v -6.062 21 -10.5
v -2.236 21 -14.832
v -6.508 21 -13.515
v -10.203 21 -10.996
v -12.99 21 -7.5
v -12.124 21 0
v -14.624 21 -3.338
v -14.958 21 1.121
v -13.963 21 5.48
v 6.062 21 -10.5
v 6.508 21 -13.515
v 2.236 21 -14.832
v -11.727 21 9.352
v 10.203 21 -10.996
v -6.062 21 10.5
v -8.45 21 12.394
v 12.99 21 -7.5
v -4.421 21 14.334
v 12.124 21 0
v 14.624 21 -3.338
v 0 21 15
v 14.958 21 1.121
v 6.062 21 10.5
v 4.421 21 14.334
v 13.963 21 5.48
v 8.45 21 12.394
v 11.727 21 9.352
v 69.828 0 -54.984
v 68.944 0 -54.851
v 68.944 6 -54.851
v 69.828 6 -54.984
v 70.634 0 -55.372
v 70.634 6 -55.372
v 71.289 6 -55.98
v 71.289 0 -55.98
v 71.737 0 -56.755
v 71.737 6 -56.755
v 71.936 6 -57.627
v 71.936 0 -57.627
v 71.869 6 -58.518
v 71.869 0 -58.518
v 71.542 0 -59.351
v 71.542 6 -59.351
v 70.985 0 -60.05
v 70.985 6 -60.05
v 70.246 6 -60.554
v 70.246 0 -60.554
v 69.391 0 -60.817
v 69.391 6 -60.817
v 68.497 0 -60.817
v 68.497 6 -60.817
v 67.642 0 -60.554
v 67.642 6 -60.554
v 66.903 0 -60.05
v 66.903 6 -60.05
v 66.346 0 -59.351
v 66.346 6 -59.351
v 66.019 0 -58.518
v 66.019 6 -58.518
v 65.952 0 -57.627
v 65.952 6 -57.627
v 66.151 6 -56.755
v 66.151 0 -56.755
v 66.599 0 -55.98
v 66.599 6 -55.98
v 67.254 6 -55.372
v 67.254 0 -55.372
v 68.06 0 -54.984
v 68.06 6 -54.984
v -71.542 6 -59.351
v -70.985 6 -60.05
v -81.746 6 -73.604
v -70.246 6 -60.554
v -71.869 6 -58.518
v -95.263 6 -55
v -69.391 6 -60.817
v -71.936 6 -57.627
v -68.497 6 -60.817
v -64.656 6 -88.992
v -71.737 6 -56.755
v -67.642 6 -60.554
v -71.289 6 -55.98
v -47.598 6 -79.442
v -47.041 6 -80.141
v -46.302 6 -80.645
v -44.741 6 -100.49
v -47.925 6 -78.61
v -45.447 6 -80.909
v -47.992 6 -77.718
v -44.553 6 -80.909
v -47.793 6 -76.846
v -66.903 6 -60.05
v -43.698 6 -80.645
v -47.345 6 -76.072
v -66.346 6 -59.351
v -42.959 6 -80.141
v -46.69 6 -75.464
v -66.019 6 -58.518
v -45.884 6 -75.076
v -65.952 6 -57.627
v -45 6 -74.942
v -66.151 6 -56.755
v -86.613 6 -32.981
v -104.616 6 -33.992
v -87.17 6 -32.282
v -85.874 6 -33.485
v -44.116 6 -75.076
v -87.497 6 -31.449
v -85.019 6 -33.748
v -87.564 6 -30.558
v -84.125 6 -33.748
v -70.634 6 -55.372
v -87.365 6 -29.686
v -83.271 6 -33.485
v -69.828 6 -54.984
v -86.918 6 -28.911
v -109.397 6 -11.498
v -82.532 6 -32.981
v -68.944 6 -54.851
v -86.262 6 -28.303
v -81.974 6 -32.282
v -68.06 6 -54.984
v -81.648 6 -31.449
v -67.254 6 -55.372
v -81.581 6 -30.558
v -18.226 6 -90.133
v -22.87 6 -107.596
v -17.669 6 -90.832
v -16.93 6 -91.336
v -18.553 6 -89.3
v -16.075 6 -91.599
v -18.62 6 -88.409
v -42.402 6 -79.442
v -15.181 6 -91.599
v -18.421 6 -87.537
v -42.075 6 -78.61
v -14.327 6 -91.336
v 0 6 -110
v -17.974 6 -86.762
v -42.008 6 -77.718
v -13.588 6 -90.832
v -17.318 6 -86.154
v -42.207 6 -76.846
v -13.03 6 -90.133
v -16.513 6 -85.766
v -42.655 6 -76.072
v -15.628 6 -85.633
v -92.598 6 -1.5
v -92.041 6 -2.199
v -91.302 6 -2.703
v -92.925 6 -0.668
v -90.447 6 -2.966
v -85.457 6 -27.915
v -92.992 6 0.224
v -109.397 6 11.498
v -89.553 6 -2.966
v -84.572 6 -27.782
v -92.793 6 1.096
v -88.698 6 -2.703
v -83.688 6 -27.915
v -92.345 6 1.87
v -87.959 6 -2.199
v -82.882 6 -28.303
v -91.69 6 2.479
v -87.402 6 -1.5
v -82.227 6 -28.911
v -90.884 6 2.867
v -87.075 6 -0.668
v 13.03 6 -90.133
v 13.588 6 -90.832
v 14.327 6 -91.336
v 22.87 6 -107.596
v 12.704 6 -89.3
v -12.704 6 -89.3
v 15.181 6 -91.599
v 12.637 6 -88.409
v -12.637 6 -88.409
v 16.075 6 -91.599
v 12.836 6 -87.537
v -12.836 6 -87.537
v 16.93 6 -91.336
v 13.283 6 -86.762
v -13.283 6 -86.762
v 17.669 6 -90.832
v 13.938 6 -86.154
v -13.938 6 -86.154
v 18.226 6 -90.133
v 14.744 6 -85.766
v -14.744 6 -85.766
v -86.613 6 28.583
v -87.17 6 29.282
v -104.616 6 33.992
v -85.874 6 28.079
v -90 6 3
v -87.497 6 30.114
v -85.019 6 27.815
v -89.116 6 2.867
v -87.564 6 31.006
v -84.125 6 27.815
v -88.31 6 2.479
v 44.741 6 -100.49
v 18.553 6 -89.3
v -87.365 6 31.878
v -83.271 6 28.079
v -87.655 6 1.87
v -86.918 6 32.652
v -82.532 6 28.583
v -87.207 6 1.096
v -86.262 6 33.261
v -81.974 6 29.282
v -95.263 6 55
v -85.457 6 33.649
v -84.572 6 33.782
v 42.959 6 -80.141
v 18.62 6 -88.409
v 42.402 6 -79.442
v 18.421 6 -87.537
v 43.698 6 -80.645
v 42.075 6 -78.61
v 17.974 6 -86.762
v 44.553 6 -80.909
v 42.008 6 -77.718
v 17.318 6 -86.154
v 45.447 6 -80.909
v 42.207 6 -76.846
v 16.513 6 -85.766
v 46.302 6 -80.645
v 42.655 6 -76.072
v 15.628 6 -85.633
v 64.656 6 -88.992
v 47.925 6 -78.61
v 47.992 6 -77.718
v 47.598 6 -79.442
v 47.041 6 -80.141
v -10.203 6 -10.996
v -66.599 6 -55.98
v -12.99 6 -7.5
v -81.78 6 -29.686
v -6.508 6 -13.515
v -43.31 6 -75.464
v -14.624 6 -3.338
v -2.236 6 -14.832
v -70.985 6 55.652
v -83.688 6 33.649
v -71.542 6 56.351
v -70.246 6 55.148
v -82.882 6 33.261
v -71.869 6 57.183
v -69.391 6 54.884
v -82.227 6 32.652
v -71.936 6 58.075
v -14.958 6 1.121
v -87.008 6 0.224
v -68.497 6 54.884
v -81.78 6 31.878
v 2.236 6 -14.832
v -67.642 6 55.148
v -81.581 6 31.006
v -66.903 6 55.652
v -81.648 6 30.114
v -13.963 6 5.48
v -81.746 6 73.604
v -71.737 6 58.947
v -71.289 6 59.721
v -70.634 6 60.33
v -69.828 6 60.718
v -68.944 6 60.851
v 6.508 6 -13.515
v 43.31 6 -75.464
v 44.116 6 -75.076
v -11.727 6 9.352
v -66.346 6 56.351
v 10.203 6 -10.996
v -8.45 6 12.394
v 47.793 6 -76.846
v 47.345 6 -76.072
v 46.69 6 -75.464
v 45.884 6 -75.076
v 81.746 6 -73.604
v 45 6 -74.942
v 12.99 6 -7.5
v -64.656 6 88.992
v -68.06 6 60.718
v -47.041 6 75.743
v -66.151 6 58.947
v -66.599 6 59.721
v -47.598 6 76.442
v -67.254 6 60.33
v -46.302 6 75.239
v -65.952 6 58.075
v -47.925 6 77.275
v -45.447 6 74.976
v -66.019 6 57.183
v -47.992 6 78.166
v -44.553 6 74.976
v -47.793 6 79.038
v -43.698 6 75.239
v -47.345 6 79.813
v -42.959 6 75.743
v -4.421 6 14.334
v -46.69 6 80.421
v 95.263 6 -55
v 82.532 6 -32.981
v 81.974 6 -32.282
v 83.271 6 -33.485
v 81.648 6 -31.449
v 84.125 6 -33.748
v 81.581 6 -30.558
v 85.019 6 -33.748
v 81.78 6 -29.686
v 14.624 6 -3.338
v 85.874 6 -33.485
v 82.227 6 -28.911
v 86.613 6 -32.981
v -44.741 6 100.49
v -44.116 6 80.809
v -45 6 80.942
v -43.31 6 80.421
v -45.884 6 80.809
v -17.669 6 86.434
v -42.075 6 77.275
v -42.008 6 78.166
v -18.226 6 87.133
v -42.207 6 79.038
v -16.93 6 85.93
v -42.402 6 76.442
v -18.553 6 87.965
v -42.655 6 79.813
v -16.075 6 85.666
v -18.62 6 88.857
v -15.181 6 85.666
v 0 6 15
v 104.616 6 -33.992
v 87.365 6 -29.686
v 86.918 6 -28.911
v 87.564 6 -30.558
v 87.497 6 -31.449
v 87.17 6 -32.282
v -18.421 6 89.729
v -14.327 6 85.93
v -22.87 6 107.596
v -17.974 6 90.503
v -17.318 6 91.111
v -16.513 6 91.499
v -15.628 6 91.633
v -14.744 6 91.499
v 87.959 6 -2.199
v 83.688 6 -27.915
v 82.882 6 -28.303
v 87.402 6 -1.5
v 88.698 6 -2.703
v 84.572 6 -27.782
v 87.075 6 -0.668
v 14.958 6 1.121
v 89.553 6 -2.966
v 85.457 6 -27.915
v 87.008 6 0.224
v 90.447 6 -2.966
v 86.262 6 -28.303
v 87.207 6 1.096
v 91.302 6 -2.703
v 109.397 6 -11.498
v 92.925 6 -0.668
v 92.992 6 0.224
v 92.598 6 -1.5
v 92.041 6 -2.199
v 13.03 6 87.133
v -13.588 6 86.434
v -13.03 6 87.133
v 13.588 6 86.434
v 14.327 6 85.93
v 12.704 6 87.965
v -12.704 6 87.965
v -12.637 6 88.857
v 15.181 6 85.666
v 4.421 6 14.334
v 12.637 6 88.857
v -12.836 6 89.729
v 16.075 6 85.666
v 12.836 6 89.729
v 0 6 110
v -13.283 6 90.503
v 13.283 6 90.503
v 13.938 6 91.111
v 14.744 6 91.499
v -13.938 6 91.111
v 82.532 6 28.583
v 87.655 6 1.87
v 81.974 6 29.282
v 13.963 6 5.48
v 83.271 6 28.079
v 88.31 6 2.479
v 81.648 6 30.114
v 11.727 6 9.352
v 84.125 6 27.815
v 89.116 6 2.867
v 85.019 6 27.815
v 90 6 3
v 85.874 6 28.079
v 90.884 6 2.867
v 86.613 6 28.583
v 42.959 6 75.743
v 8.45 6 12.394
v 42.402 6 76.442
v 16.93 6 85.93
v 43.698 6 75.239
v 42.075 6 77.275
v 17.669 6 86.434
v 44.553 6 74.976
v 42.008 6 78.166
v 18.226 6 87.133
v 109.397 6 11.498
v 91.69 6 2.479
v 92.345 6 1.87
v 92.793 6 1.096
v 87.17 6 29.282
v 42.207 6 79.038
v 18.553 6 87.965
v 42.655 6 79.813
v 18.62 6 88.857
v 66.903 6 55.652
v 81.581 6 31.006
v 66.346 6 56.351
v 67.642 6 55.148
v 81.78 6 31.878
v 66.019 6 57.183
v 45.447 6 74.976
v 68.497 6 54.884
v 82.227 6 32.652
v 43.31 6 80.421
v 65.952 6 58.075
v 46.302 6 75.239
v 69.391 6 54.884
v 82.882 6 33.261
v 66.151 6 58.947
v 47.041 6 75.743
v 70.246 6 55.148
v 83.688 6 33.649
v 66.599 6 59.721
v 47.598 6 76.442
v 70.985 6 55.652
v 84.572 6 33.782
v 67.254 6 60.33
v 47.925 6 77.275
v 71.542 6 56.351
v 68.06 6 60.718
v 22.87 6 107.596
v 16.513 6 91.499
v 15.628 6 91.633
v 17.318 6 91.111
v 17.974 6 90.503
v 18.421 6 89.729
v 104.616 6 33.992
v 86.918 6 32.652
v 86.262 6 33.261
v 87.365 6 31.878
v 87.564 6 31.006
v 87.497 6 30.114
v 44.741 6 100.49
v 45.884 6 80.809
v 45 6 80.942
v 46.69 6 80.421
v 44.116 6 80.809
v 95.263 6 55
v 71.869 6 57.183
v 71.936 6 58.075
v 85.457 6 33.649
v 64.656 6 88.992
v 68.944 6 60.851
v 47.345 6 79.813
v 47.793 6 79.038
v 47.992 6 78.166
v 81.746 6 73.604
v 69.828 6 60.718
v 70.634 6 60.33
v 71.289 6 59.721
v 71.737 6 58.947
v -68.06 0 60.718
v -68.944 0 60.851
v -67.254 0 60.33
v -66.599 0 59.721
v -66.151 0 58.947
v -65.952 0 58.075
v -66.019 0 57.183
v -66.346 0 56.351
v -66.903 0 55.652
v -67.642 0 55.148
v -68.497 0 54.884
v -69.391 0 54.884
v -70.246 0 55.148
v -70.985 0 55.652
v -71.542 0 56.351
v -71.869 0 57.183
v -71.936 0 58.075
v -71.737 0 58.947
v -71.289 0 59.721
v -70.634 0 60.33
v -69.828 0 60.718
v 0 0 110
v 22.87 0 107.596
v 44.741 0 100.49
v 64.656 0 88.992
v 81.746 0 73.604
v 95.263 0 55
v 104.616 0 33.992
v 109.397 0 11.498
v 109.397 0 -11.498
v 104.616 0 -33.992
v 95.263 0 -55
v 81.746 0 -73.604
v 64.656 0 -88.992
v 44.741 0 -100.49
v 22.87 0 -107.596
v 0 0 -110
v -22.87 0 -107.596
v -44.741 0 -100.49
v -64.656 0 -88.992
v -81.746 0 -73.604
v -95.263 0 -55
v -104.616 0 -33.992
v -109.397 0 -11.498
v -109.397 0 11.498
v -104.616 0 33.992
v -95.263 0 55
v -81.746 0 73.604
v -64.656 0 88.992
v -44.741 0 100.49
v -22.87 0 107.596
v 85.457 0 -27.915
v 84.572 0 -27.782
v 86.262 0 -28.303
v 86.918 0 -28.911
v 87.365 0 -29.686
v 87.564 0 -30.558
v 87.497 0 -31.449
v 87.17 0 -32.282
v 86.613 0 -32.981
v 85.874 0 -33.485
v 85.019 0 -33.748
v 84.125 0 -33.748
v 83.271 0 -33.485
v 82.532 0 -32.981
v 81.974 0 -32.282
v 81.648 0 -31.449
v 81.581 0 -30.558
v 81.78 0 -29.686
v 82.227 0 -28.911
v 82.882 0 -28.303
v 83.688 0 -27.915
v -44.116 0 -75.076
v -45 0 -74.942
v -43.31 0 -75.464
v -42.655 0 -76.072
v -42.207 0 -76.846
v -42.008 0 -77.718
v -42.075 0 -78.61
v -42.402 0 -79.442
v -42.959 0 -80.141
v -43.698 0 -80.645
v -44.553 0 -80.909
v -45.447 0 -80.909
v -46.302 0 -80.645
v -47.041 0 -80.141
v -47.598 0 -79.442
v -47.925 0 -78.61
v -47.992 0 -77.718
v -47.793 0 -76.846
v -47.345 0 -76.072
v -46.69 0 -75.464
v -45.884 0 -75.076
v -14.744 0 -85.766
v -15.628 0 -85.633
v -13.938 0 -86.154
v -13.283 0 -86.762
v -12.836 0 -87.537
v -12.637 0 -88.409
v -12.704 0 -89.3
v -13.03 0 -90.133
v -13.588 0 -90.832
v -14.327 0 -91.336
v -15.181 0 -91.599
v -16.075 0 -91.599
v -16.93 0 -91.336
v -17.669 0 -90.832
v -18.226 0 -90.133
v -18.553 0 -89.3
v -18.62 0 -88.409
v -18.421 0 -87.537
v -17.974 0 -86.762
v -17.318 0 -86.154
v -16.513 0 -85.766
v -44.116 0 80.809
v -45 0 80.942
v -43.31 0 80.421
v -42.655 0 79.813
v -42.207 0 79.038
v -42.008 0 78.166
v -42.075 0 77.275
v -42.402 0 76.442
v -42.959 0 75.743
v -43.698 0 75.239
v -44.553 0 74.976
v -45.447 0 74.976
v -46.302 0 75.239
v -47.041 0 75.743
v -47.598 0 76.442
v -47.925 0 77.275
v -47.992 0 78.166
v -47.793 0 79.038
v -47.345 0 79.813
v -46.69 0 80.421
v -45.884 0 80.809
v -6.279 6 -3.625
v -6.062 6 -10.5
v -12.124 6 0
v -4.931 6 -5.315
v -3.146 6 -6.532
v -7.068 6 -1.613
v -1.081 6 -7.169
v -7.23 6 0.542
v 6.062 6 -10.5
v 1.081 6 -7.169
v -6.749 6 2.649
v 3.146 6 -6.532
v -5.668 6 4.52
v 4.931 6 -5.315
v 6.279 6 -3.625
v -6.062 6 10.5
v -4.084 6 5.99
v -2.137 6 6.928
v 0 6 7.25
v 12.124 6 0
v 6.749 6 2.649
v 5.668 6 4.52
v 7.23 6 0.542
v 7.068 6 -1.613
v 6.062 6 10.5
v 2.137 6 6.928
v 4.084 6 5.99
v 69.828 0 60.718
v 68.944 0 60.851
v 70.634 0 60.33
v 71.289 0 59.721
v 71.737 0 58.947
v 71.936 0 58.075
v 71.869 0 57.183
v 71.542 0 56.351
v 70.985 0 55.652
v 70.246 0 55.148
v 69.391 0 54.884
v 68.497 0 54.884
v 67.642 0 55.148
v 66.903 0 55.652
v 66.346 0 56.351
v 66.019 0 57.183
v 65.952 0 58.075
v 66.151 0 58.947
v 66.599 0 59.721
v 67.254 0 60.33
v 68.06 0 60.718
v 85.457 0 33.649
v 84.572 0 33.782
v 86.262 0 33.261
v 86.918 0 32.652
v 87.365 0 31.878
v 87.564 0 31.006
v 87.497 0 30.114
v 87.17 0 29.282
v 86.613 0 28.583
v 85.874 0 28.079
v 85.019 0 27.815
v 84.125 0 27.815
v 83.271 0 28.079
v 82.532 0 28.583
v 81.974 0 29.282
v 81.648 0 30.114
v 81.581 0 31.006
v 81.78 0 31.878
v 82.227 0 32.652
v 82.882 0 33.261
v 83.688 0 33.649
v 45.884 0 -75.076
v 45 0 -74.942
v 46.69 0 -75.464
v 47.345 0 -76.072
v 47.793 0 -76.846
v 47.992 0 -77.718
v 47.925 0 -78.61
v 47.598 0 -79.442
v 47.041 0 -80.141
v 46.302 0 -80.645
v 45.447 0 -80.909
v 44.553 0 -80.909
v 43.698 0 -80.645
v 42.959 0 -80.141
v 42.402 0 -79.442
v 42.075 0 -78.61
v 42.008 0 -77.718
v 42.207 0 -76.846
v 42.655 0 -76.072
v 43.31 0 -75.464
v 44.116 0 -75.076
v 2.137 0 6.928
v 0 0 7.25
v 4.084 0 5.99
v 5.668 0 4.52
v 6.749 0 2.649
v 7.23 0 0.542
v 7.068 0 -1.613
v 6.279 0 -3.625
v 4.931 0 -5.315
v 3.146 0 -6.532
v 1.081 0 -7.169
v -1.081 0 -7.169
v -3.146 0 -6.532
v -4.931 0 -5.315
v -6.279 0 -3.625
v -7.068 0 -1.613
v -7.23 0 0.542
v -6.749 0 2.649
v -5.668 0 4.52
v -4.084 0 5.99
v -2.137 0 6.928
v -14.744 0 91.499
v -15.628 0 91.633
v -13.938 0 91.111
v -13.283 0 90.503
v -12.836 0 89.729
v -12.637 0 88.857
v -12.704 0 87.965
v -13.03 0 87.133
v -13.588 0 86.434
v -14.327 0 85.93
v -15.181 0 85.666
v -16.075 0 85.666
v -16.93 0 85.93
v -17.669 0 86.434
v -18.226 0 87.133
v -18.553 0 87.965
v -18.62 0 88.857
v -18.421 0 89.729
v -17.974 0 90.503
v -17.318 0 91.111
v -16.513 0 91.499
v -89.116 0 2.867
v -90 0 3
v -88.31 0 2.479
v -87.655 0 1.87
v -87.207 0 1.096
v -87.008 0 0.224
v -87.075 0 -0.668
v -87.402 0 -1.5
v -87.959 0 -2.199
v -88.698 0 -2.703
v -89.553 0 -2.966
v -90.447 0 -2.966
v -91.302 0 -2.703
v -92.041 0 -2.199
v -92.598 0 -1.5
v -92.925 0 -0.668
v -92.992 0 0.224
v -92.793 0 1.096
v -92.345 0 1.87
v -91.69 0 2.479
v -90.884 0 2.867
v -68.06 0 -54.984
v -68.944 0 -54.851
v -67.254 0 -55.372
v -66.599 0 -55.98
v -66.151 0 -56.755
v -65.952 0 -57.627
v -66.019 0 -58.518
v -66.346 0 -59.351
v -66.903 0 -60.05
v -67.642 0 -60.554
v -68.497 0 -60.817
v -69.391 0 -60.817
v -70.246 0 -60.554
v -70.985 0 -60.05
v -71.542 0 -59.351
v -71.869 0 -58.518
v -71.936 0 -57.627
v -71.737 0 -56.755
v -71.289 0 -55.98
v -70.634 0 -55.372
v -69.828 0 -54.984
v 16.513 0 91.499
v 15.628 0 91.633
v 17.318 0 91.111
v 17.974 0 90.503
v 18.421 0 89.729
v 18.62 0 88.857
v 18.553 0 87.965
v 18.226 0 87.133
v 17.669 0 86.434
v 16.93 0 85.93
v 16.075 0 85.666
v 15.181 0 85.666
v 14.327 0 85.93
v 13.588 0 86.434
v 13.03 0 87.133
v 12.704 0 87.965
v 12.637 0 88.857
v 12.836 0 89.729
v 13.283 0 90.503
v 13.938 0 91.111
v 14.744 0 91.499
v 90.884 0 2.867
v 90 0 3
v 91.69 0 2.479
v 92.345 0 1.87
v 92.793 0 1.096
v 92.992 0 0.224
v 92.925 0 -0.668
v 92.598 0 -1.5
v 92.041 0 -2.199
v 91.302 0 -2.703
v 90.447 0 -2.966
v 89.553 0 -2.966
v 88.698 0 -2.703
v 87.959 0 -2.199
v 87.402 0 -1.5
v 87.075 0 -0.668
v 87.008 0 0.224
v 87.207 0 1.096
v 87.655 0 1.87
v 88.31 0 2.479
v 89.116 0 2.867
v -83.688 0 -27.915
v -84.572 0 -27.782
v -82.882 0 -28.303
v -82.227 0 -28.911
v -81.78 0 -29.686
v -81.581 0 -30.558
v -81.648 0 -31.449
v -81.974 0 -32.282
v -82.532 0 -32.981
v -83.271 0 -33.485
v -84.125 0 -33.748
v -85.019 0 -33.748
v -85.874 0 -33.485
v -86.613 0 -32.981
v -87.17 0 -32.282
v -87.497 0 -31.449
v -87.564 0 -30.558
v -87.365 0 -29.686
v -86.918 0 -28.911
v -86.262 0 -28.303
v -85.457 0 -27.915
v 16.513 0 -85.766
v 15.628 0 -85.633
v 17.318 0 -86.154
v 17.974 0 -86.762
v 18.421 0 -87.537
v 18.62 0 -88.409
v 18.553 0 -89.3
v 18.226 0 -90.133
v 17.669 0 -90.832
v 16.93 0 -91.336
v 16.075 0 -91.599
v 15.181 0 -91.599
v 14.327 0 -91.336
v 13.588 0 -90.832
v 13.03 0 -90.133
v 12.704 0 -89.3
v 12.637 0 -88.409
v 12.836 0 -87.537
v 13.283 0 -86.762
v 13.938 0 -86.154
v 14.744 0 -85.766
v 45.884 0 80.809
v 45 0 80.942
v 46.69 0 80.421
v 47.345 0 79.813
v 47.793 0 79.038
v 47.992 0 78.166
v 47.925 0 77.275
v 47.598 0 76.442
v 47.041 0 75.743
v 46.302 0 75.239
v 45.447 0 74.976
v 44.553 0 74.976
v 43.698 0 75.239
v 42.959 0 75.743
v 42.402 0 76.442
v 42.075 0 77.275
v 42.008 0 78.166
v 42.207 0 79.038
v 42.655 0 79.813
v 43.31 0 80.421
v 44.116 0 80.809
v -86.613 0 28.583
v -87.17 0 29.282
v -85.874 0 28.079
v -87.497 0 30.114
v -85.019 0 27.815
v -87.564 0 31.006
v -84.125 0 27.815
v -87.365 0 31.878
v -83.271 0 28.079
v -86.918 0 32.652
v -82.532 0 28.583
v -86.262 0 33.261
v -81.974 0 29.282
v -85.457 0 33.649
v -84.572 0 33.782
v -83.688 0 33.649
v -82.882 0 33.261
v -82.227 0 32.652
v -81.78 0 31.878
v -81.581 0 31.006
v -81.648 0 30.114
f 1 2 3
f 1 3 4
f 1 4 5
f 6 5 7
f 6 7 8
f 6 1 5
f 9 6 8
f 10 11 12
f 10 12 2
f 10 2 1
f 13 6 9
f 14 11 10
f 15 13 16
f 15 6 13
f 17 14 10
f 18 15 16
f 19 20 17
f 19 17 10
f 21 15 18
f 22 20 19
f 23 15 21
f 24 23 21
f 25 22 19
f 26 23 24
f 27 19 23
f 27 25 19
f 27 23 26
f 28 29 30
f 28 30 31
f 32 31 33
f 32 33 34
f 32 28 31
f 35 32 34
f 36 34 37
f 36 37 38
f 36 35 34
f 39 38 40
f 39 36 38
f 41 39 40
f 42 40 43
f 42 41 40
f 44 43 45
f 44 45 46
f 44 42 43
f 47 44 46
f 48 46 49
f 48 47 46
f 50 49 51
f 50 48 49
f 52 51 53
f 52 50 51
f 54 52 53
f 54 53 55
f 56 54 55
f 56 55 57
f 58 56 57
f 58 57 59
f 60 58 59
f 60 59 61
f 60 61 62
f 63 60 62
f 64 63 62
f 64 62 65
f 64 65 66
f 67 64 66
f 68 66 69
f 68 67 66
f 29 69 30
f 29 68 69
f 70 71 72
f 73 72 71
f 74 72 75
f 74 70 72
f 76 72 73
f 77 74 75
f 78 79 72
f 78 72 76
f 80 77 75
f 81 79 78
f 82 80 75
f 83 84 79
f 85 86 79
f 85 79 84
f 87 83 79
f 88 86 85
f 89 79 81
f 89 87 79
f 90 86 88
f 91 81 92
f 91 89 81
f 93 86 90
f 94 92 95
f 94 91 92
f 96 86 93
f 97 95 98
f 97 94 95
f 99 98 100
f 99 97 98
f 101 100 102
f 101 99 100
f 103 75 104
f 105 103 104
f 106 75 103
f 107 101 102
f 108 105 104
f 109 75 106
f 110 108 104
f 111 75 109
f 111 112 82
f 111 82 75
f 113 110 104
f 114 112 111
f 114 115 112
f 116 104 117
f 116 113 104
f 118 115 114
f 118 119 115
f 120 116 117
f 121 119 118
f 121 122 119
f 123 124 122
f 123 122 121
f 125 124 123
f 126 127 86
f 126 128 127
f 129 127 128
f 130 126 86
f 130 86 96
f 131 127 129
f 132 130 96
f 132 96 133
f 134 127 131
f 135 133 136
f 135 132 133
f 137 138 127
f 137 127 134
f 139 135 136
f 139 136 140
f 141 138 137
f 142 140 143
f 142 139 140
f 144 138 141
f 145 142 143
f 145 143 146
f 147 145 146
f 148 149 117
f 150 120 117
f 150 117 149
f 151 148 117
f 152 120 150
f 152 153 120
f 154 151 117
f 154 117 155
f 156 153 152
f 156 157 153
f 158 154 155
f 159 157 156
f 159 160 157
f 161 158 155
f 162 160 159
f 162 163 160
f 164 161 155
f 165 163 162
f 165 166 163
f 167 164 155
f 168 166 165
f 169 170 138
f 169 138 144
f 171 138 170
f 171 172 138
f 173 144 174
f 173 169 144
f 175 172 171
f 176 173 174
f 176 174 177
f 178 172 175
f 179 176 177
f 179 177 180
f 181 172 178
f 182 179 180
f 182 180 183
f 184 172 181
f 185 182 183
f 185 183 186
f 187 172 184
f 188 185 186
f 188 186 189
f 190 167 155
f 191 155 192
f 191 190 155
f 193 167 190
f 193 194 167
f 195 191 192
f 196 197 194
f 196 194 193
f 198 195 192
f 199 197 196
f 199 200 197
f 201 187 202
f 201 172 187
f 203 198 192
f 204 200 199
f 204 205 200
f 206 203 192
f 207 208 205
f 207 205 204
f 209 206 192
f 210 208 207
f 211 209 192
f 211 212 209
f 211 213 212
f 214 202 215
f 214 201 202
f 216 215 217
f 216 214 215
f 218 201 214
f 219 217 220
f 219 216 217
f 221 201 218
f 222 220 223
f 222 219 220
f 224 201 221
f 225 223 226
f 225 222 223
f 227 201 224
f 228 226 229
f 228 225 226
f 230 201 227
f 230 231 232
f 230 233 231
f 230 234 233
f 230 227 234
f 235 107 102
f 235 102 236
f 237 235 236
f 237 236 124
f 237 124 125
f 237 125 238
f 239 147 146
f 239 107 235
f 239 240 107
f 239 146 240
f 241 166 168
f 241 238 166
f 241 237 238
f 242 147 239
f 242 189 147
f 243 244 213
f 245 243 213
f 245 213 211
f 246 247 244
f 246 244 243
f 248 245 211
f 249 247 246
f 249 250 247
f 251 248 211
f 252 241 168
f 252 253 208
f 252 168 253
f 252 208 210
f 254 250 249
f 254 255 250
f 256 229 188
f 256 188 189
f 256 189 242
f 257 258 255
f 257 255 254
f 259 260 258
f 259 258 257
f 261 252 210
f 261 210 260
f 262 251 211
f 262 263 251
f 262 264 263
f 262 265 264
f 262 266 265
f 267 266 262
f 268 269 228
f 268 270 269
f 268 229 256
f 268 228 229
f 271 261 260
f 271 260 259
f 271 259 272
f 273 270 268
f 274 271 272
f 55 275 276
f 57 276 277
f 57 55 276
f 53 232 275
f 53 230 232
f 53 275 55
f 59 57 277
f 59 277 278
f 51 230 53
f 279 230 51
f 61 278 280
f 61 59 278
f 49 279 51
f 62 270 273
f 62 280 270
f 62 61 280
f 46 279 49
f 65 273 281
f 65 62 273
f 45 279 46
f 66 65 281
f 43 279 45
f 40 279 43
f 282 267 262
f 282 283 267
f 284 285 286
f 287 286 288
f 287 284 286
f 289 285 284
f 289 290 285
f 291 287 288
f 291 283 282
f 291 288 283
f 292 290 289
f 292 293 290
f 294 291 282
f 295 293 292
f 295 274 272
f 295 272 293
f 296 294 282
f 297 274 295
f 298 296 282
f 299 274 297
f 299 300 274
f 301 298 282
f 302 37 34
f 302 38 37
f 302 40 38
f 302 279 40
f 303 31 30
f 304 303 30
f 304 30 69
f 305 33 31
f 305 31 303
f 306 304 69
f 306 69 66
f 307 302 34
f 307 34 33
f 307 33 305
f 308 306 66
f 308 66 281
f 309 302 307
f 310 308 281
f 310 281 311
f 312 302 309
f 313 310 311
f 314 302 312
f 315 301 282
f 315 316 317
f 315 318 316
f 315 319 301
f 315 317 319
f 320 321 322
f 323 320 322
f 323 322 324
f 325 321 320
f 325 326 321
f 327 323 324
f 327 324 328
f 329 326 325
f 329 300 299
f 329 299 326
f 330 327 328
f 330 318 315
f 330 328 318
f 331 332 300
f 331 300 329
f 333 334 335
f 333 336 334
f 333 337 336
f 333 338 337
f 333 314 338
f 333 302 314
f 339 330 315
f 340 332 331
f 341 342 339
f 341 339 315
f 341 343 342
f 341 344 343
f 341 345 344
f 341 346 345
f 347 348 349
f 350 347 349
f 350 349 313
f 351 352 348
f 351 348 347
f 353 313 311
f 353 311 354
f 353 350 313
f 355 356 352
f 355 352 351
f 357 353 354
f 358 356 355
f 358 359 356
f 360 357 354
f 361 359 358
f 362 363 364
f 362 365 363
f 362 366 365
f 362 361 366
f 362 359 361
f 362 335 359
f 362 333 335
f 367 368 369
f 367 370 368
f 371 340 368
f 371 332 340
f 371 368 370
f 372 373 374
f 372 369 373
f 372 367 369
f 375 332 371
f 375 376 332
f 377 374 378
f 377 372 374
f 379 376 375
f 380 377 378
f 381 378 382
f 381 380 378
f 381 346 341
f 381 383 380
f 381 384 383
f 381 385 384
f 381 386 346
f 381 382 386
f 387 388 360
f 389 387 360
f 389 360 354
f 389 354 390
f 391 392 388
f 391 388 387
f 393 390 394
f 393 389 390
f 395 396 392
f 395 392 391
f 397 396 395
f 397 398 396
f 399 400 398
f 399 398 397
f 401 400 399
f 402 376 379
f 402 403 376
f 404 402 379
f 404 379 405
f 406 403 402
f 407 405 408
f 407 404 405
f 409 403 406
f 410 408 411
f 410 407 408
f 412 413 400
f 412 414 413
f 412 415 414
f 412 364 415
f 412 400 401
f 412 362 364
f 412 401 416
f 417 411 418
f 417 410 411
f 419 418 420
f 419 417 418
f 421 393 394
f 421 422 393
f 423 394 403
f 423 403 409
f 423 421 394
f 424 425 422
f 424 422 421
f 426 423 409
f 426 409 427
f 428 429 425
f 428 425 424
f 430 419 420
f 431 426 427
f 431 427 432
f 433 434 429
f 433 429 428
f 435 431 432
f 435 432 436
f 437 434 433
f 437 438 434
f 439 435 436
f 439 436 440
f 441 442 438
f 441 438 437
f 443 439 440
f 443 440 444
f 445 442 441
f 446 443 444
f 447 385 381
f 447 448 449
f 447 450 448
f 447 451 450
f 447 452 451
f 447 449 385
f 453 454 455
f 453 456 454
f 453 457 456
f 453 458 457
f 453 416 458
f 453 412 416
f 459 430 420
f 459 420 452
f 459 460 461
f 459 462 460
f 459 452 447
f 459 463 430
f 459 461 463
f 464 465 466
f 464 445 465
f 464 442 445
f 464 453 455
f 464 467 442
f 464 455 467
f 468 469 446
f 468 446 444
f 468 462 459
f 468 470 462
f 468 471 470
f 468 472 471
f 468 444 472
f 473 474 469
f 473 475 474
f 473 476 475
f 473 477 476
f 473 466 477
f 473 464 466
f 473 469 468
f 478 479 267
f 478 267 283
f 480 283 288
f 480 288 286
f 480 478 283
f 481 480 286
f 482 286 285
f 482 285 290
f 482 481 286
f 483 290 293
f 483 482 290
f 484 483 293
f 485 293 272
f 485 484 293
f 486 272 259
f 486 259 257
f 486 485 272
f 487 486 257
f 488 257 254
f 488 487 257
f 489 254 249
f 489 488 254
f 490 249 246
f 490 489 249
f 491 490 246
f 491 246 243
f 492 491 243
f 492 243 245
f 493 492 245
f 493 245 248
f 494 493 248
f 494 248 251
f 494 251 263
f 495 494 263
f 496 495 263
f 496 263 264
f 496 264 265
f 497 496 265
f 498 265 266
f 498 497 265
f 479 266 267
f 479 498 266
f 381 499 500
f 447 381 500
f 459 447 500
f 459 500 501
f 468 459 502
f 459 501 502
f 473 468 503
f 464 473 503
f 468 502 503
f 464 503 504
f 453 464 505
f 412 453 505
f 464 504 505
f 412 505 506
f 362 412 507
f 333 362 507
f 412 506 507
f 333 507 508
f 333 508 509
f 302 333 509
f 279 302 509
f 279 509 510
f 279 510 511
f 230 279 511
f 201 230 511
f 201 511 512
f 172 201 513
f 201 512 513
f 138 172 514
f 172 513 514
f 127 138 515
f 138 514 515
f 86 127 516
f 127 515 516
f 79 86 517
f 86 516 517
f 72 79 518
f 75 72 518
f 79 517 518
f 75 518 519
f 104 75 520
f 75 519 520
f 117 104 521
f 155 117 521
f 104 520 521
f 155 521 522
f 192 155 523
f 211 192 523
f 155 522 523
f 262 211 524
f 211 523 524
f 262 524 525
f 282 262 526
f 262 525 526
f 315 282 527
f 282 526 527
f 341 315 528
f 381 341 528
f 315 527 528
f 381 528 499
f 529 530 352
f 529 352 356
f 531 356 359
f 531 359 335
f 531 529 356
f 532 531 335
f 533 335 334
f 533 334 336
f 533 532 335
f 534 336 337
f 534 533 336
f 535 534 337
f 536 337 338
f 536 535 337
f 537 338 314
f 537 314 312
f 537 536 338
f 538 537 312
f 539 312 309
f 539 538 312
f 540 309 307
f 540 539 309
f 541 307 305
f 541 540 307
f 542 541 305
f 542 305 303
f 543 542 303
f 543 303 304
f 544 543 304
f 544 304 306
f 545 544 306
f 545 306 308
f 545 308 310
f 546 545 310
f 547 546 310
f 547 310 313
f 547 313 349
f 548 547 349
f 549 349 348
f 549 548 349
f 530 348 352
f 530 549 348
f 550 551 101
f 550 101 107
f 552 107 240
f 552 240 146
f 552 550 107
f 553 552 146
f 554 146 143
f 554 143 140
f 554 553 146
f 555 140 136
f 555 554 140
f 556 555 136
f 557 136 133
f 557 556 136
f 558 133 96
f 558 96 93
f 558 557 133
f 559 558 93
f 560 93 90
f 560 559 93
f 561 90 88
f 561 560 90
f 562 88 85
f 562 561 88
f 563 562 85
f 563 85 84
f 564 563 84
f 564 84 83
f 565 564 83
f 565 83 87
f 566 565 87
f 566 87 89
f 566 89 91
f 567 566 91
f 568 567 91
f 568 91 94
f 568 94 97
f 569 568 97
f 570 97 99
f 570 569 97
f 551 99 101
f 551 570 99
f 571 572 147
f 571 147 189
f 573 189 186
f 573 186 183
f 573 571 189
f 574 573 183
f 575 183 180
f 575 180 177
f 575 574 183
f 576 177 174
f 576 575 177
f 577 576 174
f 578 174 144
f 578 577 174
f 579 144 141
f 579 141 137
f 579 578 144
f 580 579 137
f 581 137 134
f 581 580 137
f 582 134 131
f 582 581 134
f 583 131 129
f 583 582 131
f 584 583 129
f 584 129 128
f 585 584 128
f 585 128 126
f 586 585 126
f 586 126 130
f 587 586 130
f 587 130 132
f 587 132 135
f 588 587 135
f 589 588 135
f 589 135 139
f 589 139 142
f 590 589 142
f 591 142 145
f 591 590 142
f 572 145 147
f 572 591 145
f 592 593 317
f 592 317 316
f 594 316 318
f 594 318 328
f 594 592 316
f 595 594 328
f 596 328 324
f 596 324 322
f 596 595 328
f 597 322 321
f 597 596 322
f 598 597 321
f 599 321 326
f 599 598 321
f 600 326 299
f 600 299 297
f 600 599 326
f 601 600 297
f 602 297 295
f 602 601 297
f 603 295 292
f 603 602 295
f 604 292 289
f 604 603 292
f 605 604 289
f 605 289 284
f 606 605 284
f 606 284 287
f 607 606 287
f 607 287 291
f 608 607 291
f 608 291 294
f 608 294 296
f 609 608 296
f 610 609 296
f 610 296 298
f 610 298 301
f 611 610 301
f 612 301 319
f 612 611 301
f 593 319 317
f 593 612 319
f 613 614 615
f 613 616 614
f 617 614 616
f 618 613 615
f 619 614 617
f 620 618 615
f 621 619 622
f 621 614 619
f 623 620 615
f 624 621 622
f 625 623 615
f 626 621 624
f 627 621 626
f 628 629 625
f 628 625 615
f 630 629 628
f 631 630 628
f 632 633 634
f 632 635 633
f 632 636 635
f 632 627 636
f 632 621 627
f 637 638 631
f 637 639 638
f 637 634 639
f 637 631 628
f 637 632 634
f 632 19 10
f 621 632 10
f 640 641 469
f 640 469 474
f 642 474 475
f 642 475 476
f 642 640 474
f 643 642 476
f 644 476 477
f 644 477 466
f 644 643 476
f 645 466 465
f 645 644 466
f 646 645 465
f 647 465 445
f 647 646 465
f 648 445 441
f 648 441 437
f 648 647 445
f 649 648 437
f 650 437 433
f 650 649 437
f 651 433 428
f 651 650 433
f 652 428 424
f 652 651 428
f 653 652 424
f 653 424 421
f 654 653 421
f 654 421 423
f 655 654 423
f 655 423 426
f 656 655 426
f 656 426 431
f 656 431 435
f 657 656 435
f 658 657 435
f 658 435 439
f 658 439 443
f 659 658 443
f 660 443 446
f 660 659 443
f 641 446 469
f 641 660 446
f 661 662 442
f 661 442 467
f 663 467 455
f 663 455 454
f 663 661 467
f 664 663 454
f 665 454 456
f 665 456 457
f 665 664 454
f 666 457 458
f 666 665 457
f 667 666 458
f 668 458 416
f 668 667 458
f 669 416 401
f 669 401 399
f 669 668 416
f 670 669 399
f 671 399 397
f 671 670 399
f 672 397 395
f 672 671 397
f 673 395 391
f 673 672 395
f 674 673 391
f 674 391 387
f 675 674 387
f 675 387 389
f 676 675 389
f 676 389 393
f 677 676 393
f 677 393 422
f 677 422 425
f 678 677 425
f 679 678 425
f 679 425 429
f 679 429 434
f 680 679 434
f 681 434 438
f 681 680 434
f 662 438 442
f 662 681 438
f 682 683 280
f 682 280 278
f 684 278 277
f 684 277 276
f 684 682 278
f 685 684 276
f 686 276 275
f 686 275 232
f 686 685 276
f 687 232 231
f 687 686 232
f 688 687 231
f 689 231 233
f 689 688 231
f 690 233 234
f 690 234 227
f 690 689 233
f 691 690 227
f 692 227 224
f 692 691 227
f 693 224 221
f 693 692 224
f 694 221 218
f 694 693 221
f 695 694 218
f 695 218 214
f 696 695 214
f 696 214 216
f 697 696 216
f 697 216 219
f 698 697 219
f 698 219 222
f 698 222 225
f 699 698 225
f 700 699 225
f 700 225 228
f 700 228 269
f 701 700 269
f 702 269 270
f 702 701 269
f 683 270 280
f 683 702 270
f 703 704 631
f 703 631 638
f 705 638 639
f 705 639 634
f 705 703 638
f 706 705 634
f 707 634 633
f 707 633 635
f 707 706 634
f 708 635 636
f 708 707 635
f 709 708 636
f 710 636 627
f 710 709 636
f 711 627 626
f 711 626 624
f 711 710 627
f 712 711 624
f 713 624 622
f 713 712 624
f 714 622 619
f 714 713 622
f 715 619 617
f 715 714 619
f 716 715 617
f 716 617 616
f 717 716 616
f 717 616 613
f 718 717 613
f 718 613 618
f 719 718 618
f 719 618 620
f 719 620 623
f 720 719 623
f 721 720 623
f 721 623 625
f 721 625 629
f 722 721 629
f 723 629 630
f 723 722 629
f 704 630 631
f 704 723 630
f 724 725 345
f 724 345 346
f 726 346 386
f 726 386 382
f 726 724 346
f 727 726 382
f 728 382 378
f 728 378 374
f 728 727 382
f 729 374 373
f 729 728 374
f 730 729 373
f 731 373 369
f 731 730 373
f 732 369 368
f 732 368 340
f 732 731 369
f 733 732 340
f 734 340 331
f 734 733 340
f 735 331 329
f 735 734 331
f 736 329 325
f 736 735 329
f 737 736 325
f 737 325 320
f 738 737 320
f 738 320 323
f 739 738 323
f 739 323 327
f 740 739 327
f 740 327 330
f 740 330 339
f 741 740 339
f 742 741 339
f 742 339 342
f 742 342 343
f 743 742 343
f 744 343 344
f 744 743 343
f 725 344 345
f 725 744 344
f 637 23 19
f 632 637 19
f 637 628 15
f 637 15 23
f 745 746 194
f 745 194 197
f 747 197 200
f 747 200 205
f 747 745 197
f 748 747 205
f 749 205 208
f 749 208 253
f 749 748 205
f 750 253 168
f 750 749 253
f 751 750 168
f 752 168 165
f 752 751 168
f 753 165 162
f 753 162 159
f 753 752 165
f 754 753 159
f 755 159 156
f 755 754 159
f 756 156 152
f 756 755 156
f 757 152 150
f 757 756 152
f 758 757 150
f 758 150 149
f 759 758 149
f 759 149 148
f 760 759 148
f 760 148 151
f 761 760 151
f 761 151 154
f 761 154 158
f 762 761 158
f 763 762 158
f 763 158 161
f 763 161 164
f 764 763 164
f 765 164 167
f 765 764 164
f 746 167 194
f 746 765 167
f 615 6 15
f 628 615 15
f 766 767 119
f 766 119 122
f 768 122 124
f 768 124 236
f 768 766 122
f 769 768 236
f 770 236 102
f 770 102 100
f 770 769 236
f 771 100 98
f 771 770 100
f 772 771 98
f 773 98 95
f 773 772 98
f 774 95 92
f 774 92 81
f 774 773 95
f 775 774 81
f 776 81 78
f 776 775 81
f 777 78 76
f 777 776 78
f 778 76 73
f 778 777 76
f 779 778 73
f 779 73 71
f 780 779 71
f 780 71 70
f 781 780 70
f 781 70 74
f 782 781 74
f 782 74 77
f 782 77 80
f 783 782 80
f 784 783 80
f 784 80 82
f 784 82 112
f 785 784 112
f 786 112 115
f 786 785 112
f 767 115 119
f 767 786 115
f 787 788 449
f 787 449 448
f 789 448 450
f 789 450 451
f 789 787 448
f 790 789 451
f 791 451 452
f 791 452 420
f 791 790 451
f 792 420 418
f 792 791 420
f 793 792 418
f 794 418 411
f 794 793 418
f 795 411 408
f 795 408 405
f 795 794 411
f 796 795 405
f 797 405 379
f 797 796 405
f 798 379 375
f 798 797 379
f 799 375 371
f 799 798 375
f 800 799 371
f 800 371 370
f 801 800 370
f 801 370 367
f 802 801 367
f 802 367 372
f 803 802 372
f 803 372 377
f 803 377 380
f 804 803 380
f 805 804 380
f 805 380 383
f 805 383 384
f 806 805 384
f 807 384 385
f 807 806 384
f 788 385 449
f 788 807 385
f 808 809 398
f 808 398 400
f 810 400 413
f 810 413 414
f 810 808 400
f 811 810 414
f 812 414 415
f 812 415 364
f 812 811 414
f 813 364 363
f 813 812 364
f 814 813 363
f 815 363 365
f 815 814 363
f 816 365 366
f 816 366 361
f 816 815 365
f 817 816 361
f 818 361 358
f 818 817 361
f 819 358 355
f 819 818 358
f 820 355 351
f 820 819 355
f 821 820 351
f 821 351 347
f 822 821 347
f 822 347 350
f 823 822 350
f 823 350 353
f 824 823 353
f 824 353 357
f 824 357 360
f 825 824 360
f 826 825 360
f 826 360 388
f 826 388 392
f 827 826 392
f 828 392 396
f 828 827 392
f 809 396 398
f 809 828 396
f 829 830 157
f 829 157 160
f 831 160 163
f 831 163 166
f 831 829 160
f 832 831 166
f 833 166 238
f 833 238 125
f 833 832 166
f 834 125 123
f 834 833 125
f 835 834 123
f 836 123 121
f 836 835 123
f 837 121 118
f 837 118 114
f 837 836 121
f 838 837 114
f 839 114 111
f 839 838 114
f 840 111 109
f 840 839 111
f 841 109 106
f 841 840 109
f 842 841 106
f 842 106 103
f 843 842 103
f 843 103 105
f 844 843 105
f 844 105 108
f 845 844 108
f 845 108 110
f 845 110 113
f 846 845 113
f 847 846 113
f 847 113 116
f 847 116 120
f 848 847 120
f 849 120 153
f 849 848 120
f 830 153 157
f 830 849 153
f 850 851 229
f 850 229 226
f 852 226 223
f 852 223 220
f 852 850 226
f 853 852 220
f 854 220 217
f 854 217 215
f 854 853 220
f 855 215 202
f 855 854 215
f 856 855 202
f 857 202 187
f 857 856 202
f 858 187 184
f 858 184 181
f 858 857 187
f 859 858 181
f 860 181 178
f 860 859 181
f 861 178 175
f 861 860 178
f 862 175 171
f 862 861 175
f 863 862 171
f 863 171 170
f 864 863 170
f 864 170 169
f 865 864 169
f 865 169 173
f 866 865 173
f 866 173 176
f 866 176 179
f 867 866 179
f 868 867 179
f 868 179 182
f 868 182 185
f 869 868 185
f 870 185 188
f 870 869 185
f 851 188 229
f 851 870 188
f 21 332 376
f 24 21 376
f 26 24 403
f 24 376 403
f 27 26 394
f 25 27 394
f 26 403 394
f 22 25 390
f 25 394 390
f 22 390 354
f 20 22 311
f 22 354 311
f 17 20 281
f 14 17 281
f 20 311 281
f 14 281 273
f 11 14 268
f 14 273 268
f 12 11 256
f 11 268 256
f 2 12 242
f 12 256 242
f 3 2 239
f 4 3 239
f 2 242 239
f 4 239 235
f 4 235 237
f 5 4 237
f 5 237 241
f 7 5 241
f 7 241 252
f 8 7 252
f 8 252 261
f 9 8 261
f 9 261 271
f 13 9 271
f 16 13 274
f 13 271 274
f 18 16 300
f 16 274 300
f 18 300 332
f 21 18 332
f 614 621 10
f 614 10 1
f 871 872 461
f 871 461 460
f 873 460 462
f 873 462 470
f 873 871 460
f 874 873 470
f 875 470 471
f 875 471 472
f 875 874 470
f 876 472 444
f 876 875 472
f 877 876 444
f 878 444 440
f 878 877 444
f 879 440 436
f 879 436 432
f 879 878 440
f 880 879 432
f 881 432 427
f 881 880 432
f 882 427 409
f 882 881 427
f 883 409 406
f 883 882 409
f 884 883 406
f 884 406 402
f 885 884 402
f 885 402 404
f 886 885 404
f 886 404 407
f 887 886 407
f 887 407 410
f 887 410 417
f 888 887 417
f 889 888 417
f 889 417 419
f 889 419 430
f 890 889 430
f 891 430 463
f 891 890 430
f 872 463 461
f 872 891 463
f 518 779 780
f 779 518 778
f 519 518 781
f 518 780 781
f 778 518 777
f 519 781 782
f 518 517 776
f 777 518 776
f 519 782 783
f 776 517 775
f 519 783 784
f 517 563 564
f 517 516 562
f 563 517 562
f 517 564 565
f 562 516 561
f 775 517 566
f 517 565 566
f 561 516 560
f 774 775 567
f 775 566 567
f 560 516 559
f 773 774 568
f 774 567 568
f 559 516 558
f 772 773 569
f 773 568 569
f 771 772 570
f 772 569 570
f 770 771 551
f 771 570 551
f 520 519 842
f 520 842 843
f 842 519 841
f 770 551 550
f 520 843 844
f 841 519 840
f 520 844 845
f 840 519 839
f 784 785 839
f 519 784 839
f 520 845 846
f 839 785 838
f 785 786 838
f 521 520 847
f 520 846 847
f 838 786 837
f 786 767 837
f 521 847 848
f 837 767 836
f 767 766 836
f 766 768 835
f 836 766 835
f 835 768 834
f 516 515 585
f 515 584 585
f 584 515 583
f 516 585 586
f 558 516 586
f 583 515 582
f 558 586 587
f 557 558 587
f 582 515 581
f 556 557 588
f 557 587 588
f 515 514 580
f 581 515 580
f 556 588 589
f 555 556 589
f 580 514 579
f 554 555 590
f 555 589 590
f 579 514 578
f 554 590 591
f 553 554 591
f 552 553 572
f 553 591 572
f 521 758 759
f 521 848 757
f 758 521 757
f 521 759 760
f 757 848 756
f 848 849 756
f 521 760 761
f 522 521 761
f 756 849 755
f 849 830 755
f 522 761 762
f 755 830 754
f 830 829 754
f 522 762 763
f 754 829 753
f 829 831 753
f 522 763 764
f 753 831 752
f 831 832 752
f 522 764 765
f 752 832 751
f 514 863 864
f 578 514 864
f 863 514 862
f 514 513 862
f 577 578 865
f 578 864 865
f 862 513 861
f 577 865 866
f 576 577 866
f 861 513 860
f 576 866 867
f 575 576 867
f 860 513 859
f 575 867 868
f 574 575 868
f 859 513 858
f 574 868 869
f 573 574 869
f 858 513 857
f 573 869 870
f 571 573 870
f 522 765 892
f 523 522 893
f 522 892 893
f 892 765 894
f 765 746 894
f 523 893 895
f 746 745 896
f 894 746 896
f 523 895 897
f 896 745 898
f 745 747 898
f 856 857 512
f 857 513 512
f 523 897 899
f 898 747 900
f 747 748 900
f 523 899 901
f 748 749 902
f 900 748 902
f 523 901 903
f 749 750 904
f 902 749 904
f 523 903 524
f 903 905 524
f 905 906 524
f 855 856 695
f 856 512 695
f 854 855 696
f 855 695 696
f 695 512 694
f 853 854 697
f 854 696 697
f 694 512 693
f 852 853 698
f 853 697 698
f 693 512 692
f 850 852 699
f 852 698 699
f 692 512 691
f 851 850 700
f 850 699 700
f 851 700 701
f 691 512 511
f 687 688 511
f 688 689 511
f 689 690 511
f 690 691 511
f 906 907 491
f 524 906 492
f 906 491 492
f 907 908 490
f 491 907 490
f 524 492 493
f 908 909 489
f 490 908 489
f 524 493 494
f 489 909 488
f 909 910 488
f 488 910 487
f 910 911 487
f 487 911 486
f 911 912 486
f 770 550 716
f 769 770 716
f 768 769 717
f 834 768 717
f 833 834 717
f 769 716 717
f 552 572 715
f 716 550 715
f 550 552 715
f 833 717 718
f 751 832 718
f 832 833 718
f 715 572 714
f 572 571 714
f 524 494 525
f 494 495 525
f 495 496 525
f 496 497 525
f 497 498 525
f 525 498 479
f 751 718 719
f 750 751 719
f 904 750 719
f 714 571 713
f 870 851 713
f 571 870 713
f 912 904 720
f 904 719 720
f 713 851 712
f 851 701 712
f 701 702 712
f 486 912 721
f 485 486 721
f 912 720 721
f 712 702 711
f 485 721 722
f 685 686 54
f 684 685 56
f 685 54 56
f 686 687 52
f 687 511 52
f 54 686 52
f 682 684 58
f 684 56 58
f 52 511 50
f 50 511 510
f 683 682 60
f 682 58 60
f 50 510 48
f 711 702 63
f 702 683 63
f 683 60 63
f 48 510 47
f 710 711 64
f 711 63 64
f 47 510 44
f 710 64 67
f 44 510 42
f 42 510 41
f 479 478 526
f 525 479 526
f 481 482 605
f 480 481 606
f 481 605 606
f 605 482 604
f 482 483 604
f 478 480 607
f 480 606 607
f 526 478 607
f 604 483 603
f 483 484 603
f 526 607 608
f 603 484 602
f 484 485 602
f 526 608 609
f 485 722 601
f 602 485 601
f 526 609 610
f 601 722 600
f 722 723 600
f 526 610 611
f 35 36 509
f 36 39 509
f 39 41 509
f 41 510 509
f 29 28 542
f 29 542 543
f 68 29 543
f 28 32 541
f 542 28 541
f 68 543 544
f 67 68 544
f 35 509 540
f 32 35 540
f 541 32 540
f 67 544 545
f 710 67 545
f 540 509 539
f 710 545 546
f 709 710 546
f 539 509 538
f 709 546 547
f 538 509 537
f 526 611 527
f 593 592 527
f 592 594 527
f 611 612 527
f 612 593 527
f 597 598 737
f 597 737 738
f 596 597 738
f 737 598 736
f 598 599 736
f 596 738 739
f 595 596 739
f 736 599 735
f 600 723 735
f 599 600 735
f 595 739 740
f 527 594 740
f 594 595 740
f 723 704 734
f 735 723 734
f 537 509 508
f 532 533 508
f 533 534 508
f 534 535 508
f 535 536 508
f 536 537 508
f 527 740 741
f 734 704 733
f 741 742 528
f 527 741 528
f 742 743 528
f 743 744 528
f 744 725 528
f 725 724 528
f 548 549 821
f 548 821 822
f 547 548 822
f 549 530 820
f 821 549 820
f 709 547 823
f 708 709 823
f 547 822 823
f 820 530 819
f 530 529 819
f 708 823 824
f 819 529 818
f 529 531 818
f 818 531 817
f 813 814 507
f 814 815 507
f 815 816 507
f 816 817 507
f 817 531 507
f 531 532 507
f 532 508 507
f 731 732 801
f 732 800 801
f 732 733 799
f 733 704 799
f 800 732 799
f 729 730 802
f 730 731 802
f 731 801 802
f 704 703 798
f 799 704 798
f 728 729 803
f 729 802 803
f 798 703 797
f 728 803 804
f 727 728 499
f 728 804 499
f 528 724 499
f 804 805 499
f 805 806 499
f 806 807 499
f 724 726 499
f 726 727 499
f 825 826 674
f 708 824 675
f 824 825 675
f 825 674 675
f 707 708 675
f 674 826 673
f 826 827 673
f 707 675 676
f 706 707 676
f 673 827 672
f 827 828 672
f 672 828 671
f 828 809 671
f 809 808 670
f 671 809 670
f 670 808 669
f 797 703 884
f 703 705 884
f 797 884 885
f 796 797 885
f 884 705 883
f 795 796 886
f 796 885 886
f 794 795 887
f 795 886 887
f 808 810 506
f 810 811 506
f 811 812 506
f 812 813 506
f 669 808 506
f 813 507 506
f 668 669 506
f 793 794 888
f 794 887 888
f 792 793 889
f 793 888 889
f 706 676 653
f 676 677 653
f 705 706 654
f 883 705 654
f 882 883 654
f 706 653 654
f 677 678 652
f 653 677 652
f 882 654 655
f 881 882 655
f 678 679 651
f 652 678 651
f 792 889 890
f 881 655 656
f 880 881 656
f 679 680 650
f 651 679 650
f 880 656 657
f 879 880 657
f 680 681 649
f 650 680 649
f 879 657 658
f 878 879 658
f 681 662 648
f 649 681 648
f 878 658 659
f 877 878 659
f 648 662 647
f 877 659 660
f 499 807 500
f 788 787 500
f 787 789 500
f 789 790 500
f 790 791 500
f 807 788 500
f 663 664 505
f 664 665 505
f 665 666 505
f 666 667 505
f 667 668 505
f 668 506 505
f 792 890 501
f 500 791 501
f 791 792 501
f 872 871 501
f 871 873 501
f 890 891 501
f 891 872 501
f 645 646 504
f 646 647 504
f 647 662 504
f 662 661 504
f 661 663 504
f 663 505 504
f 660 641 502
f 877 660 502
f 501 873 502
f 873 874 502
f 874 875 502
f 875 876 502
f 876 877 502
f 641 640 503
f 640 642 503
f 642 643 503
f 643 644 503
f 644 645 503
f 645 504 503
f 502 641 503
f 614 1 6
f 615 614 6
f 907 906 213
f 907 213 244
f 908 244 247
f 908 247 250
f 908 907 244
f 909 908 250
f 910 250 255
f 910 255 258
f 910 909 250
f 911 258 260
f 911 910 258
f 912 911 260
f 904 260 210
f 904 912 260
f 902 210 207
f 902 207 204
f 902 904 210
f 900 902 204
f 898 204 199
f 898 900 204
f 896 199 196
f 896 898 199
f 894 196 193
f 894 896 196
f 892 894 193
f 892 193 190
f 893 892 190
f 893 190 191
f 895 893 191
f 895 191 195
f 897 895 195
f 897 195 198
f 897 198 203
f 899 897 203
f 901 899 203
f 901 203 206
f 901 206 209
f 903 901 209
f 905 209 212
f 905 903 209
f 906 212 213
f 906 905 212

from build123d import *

# Parameters (mm, degrees)
SKETCH1_R           = 110
SKETCH1_R_2         = 3
SKETCH1_R_3         = 7.25
BOSS_EXTRUDE1_DEPTH = 6
SKETCH3_R           = 15
BOSS_EXTRUDE2_DEPTH = 15


with BuildPart() as part:
    # Sketch1 → Boss-Extrude1 (new body)
    with BuildSketch(Plane(origin=(0, 0, 0), x_dir=(1, 0, 0), z_dir=(0, 1, 0))):
        Circle(SKETCH1_R)
        with Locations((-90, 0)):
            Circle(SKETCH1_R_2, mode=Mode.SUBTRACT)
        with Locations((-84.572335871, 30.781812899)):
            Circle(SKETCH1_R_2, mode=Mode.SUBTRACT)
        with Locations((-68.943999881, 57.850884872)):
            Circle(SKETCH1_R_2, mode=Mode.SUBTRACT)
        with Locations((-45, 77.942286341)):
            Circle(SKETCH1_R_2, mode=Mode.SUBTRACT)
        with Locations((-15.62833599, 88.632697771)):
            Circle(SKETCH1_R_2, mode=Mode.SUBTRACT)
        with Locations((15.62833599, 88.632697771)):
            Circle(SKETCH1_R_2, mode=Mode.SUBTRACT)
        with Locations((45, 77.942286341)):
            Circle(SKETCH1_R_2, mode=Mode.SUBTRACT)
        with Locations((68.943999881, 57.850884872)):
            Circle(SKETCH1_R_2, mode=Mode.SUBTRACT)
        with Locations((84.572335871, 30.781812899)):
            Circle(SKETCH1_R_2, mode=Mode.SUBTRACT)
        with Locations((90, 0)):
            Circle(SKETCH1_R_2, mode=Mode.SUBTRACT)
        with Locations((84.572335871, -30.781812899)):
            Circle(SKETCH1_R_2, mode=Mode.SUBTRACT)
        with Locations((68.943999881, -57.850884872)):
            Circle(SKETCH1_R_2, mode=Mode.SUBTRACT)
        with Locations((45, -77.942286341)):
            Circle(SKETCH1_R_2, mode=Mode.SUBTRACT)
        with Locations((15.62833599, -88.632697771)):
            Circle(SKETCH1_R_2, mode=Mode.SUBTRACT)
        with Locations((-15.62833599, -88.632697771)):
            Circle(SKETCH1_R_2, mode=Mode.SUBTRACT)
        with Locations((-45, -77.942286341)):
            Circle(SKETCH1_R_2, mode=Mode.SUBTRACT)
        with Locations((-68.943999881, -57.850884872)):
            Circle(SKETCH1_R_2, mode=Mode.SUBTRACT)
        with Locations((-84.572335871, -30.781812899)):
            Circle(SKETCH1_R_2, mode=Mode.SUBTRACT)
        Circle(SKETCH1_R_3, mode=Mode.SUBTRACT)
    extrude(amount=BOSS_EXTRUDE1_DEPTH)

    # Sketch3 → Boss-Extrude2 (add)
    with BuildSketch(Plane(origin=(0, 6, 0), x_dir=(1, 0, 0), z_dir=(0, 1, 0))):
        Circle(SKETCH3_R)
        Polygon((-6.062177826, 10.5), (-12.124355653, 0), (-6.062177826, -10.5), (6.062177826, -10.5), (12.124355653, 0), (6.062177826, 10.5), align=None, mode=Mode.SUBTRACT)
    extrude(amount=BOSS_EXTRUDE2_DEPTH)


solid = part.part
